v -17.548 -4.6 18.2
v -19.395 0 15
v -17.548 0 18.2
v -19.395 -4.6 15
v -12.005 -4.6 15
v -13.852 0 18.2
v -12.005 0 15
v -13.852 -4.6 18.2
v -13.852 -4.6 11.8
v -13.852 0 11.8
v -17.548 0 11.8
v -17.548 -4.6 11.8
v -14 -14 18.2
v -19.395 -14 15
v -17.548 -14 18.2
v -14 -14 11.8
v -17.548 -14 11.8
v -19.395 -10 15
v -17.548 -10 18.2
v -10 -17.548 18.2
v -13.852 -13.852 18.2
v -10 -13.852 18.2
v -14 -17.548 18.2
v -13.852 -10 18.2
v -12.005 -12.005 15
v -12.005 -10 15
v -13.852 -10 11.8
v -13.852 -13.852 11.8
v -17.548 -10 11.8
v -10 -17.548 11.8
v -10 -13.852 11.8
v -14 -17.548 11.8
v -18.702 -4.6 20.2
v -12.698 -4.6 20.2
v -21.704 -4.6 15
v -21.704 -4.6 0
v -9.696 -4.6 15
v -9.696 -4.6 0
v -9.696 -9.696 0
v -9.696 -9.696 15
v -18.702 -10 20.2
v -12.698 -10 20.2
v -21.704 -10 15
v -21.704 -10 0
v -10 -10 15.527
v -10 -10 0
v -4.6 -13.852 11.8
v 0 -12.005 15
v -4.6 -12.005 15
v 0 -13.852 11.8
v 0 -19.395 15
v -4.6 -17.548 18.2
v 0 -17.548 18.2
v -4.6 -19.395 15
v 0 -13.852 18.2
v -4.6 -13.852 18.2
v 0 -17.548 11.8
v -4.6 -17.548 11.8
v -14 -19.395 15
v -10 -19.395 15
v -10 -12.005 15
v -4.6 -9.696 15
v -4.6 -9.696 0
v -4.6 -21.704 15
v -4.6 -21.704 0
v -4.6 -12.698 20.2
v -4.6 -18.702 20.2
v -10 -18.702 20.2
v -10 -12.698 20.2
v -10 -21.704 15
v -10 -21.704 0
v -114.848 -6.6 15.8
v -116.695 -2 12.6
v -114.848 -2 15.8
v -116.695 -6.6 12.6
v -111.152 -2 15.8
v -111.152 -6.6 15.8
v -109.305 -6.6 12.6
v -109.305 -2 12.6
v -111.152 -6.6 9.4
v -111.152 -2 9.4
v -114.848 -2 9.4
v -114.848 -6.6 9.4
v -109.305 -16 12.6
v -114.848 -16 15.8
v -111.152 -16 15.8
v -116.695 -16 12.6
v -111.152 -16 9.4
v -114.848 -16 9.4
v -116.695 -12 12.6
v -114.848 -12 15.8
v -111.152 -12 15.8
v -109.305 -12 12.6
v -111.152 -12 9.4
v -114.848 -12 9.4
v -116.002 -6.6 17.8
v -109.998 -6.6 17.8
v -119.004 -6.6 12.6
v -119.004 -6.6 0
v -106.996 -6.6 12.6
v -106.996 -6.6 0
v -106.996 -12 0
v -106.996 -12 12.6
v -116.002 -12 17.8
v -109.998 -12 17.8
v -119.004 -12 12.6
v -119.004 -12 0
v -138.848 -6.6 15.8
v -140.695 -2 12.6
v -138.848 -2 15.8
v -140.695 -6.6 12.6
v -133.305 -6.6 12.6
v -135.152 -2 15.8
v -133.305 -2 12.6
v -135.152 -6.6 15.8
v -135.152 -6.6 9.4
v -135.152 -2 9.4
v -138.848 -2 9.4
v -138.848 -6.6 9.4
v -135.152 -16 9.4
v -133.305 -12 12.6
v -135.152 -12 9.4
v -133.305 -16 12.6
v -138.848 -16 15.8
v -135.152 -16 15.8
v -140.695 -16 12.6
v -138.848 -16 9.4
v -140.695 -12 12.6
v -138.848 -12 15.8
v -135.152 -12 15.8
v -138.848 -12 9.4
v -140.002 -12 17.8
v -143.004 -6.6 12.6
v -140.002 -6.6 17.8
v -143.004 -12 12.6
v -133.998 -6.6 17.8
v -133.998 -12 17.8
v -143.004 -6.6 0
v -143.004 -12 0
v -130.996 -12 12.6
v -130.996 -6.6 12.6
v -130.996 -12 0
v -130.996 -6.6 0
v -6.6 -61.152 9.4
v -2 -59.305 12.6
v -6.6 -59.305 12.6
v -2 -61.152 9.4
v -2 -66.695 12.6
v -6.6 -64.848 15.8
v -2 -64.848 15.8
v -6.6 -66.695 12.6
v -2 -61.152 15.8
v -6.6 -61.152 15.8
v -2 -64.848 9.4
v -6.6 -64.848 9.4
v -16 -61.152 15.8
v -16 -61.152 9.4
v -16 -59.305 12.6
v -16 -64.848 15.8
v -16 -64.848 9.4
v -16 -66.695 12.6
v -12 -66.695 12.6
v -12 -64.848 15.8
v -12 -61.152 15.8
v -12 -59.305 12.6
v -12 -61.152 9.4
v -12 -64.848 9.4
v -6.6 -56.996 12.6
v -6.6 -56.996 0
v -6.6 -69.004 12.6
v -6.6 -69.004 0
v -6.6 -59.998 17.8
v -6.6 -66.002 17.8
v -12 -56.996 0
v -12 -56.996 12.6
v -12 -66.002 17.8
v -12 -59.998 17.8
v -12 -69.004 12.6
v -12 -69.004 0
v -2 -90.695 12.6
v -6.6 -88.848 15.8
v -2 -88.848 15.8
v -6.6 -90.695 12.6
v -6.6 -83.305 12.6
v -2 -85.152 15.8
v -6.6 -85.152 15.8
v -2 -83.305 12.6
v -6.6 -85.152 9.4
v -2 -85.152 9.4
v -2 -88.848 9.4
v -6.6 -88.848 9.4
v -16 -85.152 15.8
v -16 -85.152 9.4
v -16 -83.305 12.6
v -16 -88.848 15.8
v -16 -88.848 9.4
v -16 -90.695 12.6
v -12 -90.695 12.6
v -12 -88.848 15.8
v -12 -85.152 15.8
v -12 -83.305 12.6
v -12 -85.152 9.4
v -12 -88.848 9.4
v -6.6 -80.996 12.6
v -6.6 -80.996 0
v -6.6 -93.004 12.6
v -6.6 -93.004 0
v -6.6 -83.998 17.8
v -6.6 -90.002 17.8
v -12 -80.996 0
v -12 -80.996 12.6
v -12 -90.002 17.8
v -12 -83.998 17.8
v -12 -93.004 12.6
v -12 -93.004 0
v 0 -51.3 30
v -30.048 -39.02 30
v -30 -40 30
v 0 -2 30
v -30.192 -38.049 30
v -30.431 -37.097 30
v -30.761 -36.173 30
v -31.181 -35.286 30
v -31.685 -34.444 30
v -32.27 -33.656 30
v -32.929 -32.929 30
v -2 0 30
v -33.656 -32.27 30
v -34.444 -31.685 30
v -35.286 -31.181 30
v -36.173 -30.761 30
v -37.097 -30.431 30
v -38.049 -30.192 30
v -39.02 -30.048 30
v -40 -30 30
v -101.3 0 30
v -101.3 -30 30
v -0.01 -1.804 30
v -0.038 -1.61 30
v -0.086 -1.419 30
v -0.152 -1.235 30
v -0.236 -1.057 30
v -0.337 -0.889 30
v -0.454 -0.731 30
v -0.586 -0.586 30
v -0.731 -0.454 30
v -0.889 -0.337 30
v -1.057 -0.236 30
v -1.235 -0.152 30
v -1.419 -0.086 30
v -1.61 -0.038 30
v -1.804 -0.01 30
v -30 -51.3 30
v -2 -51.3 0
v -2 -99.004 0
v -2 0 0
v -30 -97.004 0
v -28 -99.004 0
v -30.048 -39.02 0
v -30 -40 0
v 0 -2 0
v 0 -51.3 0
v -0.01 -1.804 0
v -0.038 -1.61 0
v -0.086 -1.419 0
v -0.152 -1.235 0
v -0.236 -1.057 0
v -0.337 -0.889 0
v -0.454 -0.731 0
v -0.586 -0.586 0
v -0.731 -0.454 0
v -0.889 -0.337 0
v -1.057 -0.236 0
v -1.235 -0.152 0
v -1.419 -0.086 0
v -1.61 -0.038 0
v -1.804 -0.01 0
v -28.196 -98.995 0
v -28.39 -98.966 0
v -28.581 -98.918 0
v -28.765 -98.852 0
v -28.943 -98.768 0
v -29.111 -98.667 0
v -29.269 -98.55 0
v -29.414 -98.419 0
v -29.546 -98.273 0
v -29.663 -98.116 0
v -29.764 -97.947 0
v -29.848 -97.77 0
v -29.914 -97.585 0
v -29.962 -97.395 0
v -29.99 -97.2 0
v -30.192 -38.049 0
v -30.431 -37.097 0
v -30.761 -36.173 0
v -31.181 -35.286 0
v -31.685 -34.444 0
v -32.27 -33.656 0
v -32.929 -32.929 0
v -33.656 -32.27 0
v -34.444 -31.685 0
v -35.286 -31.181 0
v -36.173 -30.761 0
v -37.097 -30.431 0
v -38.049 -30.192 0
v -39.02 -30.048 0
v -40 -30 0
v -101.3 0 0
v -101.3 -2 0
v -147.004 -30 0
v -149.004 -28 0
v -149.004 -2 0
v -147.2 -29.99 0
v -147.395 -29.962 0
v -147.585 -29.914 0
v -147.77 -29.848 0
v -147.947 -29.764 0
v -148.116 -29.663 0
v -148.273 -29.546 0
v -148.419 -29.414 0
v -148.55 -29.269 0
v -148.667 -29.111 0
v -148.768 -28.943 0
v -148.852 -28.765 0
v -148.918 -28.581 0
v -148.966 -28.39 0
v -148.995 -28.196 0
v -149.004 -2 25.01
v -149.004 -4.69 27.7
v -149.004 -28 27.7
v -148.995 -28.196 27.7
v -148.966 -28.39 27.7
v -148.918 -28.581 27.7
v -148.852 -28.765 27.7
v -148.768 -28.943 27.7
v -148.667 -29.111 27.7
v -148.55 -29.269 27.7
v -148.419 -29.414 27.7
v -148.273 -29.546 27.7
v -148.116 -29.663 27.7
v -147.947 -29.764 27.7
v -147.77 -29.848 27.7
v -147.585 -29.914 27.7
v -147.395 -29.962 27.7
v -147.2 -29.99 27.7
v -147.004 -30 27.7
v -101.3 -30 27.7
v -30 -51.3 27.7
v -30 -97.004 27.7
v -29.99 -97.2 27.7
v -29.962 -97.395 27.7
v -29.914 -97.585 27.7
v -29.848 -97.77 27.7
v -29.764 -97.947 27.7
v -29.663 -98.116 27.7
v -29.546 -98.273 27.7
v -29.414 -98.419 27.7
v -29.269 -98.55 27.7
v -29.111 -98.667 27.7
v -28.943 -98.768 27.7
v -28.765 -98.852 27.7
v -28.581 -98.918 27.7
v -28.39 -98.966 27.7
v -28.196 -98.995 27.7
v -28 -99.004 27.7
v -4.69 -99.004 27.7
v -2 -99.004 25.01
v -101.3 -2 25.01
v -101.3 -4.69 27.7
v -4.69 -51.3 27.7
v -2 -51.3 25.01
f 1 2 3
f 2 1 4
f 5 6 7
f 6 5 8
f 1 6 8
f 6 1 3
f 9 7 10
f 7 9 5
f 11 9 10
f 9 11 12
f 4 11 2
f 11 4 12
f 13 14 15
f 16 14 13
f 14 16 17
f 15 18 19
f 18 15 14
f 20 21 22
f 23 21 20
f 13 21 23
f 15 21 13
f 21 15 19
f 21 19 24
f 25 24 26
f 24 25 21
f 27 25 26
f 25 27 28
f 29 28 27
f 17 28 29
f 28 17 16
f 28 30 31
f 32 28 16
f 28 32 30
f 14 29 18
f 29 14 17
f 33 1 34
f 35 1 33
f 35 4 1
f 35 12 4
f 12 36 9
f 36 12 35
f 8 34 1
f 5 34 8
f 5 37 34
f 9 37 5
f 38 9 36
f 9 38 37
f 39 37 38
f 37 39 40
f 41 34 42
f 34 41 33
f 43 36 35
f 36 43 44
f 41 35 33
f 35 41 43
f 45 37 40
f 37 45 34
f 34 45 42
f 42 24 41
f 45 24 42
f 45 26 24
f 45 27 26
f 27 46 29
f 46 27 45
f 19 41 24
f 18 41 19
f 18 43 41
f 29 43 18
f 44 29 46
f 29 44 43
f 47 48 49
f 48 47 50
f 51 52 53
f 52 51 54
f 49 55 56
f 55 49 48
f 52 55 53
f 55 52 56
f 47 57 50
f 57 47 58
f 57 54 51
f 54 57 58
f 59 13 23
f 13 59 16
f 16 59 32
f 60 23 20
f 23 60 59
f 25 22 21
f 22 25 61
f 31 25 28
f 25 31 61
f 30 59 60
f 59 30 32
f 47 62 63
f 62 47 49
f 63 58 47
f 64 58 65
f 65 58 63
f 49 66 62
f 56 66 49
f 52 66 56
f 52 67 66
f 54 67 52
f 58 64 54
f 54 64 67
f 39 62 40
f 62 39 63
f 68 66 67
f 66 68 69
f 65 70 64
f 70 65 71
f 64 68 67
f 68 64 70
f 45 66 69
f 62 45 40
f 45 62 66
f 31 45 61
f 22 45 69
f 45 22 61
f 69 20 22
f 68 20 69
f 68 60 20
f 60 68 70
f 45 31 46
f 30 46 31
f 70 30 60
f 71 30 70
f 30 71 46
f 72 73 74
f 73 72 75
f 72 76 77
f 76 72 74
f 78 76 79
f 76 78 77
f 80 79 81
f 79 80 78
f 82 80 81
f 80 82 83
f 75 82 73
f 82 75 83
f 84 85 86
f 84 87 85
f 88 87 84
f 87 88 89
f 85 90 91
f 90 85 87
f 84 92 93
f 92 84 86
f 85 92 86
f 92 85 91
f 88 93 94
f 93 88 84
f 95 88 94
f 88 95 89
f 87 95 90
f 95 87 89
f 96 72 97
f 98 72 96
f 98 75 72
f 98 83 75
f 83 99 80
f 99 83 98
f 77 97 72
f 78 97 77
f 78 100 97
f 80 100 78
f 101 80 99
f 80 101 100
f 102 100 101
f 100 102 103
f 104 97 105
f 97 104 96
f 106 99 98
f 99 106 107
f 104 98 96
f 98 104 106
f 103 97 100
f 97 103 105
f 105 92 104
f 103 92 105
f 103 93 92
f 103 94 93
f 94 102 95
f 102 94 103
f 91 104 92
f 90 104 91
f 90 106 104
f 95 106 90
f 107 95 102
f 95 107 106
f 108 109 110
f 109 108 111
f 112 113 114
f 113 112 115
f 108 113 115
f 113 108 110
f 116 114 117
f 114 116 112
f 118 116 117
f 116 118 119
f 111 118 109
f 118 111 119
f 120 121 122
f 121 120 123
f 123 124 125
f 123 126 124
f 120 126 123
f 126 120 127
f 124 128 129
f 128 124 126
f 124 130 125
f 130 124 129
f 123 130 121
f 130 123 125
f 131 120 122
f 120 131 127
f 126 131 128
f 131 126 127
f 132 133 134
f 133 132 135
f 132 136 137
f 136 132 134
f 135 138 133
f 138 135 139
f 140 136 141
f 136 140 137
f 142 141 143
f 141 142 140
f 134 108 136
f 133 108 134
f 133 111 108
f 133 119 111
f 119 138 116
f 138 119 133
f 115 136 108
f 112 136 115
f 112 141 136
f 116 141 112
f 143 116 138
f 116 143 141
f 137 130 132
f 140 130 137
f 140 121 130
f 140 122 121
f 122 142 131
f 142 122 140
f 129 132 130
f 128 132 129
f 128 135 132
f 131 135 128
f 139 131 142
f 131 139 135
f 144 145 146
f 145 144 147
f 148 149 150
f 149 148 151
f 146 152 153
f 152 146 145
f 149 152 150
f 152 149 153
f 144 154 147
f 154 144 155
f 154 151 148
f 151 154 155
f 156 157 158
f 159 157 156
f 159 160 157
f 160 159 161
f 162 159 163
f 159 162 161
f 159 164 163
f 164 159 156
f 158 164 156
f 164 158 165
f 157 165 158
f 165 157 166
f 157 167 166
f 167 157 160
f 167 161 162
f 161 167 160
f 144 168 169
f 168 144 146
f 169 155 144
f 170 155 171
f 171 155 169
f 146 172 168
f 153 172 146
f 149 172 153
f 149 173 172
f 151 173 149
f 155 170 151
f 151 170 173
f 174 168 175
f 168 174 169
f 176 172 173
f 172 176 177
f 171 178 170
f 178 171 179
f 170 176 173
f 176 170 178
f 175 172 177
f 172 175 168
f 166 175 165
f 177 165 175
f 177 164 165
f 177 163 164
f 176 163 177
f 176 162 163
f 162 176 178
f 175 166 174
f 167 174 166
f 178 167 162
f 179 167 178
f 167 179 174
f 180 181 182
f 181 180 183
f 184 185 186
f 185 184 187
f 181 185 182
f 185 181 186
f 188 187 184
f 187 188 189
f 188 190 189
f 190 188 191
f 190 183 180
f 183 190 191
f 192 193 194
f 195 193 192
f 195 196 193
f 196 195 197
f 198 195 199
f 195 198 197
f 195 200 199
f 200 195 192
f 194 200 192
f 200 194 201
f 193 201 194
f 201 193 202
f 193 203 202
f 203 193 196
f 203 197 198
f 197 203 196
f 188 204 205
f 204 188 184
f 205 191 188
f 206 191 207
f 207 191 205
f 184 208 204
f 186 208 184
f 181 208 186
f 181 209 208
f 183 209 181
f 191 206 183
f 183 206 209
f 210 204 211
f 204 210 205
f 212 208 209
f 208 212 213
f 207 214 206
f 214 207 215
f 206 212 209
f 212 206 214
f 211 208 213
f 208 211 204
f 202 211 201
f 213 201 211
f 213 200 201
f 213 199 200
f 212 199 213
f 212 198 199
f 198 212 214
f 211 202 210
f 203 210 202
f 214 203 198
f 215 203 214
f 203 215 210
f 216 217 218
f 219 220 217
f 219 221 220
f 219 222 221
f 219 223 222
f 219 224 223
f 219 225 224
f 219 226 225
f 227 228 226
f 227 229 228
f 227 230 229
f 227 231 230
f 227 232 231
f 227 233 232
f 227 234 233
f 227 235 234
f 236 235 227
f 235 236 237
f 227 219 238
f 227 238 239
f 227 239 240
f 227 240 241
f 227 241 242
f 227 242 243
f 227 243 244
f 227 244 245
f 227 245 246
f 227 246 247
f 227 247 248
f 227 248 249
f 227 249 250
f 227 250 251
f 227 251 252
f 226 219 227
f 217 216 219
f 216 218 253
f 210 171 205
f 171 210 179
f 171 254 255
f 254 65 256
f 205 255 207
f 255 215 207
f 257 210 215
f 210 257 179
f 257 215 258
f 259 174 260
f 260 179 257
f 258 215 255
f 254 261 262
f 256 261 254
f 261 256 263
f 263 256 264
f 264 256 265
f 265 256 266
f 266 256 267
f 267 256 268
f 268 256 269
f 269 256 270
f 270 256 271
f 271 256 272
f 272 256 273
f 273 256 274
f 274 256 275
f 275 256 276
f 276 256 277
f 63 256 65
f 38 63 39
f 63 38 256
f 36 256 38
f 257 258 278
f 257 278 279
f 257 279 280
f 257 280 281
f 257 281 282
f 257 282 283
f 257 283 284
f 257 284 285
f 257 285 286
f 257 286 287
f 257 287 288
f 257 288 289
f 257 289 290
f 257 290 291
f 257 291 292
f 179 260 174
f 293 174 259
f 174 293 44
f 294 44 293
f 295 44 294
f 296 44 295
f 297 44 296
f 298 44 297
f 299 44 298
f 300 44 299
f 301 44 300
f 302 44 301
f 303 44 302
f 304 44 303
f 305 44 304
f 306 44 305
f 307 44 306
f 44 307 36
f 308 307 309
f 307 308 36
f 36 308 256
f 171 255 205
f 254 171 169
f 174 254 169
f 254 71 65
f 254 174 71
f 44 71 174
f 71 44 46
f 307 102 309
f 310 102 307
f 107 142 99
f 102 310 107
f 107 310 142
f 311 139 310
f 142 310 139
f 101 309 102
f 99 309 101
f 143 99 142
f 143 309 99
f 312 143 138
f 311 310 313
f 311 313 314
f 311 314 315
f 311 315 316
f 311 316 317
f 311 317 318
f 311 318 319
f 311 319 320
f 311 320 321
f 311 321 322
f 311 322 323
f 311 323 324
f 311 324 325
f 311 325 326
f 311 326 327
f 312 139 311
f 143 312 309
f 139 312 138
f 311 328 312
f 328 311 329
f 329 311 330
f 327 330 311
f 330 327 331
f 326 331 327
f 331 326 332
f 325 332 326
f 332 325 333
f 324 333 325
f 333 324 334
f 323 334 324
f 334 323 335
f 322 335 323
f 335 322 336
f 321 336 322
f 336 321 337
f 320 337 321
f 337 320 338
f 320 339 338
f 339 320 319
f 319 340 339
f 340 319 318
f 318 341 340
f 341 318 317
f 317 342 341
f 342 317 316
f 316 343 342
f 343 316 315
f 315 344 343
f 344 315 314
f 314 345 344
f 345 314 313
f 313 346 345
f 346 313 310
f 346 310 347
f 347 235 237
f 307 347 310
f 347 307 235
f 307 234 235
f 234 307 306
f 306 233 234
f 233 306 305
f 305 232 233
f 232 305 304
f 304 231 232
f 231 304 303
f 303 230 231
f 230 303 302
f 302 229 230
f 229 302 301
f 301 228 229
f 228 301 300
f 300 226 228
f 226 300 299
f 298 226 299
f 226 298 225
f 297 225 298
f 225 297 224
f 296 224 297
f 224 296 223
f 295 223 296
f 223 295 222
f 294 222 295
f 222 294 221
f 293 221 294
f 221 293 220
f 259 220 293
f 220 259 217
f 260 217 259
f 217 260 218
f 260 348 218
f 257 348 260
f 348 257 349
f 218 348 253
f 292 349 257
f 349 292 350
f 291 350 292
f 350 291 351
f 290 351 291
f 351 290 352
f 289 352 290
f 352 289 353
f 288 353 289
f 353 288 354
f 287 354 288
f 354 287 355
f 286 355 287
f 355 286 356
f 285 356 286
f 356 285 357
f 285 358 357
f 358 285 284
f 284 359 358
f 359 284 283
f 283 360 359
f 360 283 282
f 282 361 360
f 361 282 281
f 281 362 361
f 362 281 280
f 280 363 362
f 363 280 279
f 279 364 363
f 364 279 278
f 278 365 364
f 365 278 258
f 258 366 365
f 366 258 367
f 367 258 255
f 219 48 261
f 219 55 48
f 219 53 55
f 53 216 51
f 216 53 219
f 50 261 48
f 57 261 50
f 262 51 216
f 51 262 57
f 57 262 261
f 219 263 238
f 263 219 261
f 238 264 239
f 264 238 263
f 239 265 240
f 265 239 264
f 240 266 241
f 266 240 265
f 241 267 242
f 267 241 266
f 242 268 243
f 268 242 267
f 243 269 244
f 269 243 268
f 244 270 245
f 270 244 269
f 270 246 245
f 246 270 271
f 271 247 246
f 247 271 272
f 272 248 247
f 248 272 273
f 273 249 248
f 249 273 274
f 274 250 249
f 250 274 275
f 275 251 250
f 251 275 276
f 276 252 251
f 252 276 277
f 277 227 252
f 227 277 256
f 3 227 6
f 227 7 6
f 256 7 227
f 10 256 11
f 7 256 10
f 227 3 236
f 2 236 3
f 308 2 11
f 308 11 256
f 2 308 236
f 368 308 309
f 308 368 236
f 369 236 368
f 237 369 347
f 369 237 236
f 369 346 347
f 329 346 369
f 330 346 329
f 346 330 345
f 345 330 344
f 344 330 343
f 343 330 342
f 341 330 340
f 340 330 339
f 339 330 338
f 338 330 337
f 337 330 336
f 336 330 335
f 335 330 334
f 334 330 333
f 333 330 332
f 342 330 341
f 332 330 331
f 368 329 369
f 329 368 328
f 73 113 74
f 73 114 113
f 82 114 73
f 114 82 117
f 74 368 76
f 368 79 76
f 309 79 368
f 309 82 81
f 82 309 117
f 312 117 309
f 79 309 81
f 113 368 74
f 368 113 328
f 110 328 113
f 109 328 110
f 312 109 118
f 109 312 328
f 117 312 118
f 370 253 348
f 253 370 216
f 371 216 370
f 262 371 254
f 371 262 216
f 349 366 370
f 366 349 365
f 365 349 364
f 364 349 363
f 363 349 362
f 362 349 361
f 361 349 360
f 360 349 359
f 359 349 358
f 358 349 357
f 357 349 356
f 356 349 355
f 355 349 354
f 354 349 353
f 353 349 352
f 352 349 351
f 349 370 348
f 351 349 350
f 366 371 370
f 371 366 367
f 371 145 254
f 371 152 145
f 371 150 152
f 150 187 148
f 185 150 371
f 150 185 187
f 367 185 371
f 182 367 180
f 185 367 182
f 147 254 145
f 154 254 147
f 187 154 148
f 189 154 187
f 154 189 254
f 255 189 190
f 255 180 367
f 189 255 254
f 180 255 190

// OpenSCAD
// file: ../../../modules/steel_rack.scad
use <bolts.scad>;

bolt_edge_offset = 15;
bolt_positions = [
  bolt_edge_offset,
  bolt_edge_offset + 98,
  bolt_edge_offset + 98 + 24,
];

module bolt_and_nut(y, h) {
  nut_thickness = 5;
  translate([0, y, h / 2])
    m6_bolt_hole(h + 1, center = true);
  translate([0, y, h - nut_thickness / 2])
    rotate([0, 0, 90])
    m6_nut_trap(nut_thickness, center = true);
}

module long_bar(w, y, h) {
  difference() {
    translate([w / 2, y / 2, h / 2])
      cube([w, y, h], center = true);

    for (x = bolt_positions) {
      translate([x, 0, 0])
        bolt_and_nut(y / 2, h);
    }
  }
}

module short_bar(w, y, h) {
  difference() {
    translate([w / 2, y / 2, h / 2])
      cube([w, y, h], center = true);

    translate([bolt_positions[0], 0, 0])
      bolt_and_nut(y / 2, h);
  }
}

module fillet_profile(r, h) {
  linear_extrude(height = h, center = true)
    difference() {
      square([r, r]);
      circle(r = r, $fn = 64);
    }
}
// file: ../../../modules/slide_rail_outer_bracket.scad
use <bolts.scad>
use <steel_rack.scad>

// スライドレール外側とL字アングルを接合するL字ブラケット。
// 設計の経緯と確定値は ledger/designs/steel-rack-500x400.md が正本。
//
// 座標系 (部品自身の datum):
//   X = 0 がこの部品側のL字アングル外側面。部品はアングル板厚の内側から始まる
//   Y = 0 がスライドレール外側面。+Y がラック外側
//   Z = 0 が部品底面 (レール下端と一致)
// front は screw_x = [37, 101.5]、rear は [79.5, 176] を自分の datum
// から渡す。 M6 が高さ 22.5±12 の対称配置のため部品は Z 反転対称になり、
// 左右のレールにも上下反転するだけで同じ2部品を使い回せる。

bracket_height = 45;
flange_t = 10; // 短辺 (X方向厚) の厚さ
// 長辺 (Y方向厚) の厚さ。旧断面は flange_t=10 を共用していたが、レール面を
// rail_offset 分外へ出すと M6 ナット挿入口が長辺と重なるため 2mm 削った
// (10→8、user決定)。ナット六角の内縁 (y=8.000) と長辺外面がツライチになる
arm_t = 8;
// レール接触面のラック外側オフセット。組付け実測でレール間隔が 385mm しか
// なくケース 412mm が入らないため、(412 - 385) / 2 + 0.5 = 14mm ずつ
// 各レールを外側へ移す (user指示)。M6 実穴は既に開いており位置を変えられない
rail_offset = 14;
inner_r = 4;
m6_z = [ 10.5, 34.5 ];
// クリアランス基準: 呼び寸法 + 0.4mm (実プリントの嵌合結果から拡大)
m6_pass_flat = 6.4; // M6ボルト通し六角の二面幅 (手前5mm)
m6_nut_flat = 10.4; // M6ナット窪み六角の二面幅 (奥5mm、ナット実測9.8 + 実効0.6)
m6_stage_depth = 5;
screw_z = 22.5;
m4_pass_flat = 4.4; // M4小トラスネジ通し六角の二面幅
m4_nut_flat = 7.4; // M4ナット窪み六角の二面幅 (ナット実測6.8 + 実効0.6)
m4_nut_depth = 2.8; // M4ナット窪みの深さ (user指定)
edge_margin = 8; // 穴の外縁から部品端までの余白 (自由な辺のみ)
angle_t = 2.2; // L字アングルの板厚

// 六角プリズム: 軸X・上下の辺が水平 (flat-up)。
// 天井を短い水平ブリッジにして垂れの改善を狙う
// (point-up だと天井面が水平から30°になり垂れた — 嵌合試験で確認済み)
module
hex_x_flat_up(flat_d, l)
{
    rotate([ 0, 90, 0 ]) rotate([ 0, 0, 90 ]) hex_hole(flat_d = flat_d, h = l);
}

// 六角プリズム: 軸Y・上下の辺が水平 (flat-up)。M6と同じくブリッジ天井
module
hex_y_flat_up(flat_d, l)
{
    rotate([ 90, 0, 0 ]) hex_hole(flat_d = flat_d, h = l);
}

module
slide_rail_outer_bracket(screw_x, name = "bracket")
{
    // flat-up配置では水平方向の穴半径は対角/2 (= 二面幅/(2*cos30))。
    // 8mm余白の契約はこの実半径に対して守る
    m6_nut_diag = m6_nut_flat / cos(30);
    m4_nut_diag = m4_nut_flat / cos(30);
    // M6中心: 実物のアングルには旧断面 (長辺厚10) の導出値
    // (厚10 + 内側R + 余白 + M6六角対角/2 = 28.0044) で既に穴が開いている。
    // 旧導出式から rail_offset を引くことで M6 実穴と部品外端の絶対位置を
    // 保ったまま、レール接触面 (y=0) だけをラック外側へ 14mm 出す
    m6_y = flange_t + inner_r + edge_margin + m6_nut_diag / 2 - rail_offset;
    short_len = m6_y + m6_nut_diag / 2 + edge_margin;
    // 長辺のX終端: 最奥のM4穴の最大断面 (ナット窪みの対角の半分) + 余白
    arm_end = max(screw_x) + m4_nut_diag / 2 + edge_margin;

    echo(str("CONTRACT ", name, ": height = ", bracket_height));
    echo(str("CONTRACT ", name, ": flange_t = ", flange_t));
    echo(str("CONTRACT ", name, ": arm_t = ", arm_t));
    echo(str("CONTRACT ", name, ": rail_offset = ", rail_offset));
    echo(str("CONTRACT ", name, ": inner_r = ", inner_r));
    echo(str("CONTRACT ", name, ": m6_z = ", m6_z));
    echo(str("CONTRACT ", name, ": m6_pass_flat = ", m6_pass_flat));
    echo(str("CONTRACT ", name, ": m6_nut_flat = ", m6_nut_flat));
    echo(str("CONTRACT ", name, ": screw_z = ", screw_z));
    echo(str("CONTRACT ", name, ": m4_pass_flat = ", m4_pass_flat));
    echo(str("CONTRACT ", name, ": m4_nut_flat = ", m4_nut_flat));
    echo(str("CONTRACT ", name, ": m4_nut_depth = ", m4_nut_depth));
    echo(str("CONTRACT ", name, ": edge_margin = ", edge_margin));
    echo(str("CONTRACT ", name, ": angle_t = ", angle_t));
    echo(str("CONTRACT ", name, ": screw_x = ", screw_x));
    echo(str("CONTRACT ",
             name,
             ": m6_y = ",
             m6_y,
             ", short_len = ",
             short_len,
             ", arm_end = ",
             arm_end));

    // 余白の契約 (自由な辺のみ。高さ45とM6のZはuser固定値なので対象外)。
    // M6ナット六角の内縁 (m6_y - 対角/2 = 8.000) は長辺外面 (y = arm_t) と
    // ツライチで、ナット挿入口が長辺に塞がれない (1e-9 は浮動小数の丸め猶予)
    assert(m6_y - m6_nut_diag / 2 >= arm_t - 1e-9,
           "M6 nut slot is blocked by the arm");
    assert(short_len - (m6_y + m6_nut_diag / 2) >= edge_margin,
           "M6 hole too close to the short-flange edge");
    assert(arm_end - (max(screw_x) + m4_nut_diag / 2) >= edge_margin,
           "M4 hole too close to the arm end");
    assert(min(screw_x) - m4_nut_diag / 2 >= angle_t + flange_t,
           "M4 hole overlaps the short flange");

    difference()
    {
        union()
        {
            // 短辺: アングル内側に当たる縦板 (M6で締結)
            translate([ angle_t, 0, 0 ])
                cube([ flange_t, short_len, bracket_height ]);

            // 長辺: レール外側面に当たる横板 (M4小トラスネジ+ナットで締結)
            translate([ angle_t, 0, 0 ])
                cube([ arm_end - angle_t, arm_t, bracket_height ]);

            // 内側コーナーのR4フィレット (応力集中の回避)
            translate([
                angle_t + flange_t + inner_r,
                arm_t + inner_r,
                bracket_height / 2
            ]) rotate([ 0, 0, 180 ]) fillet_profile(inner_r, bracket_height);
        }

        // M6の2段六角穴 (軸X・flat-up): 手前5mmが通し、奥5mmがナット窪み。
        // ナット窪みは +X へ延長した挿入回廊 (x=7.2..17): 短辺の背面から
        // fillet の掛かる区間を局所カットし、fillet 外端 (x=16.2) を 0.8mm
        // 超えて開放することで M6 ナットを +X 側から真っ直ぐ挿入できる
        // (fillet と挿入経路の干渉分を削るのは user 許容)。
        // 六角の下頂点 (y=8.000) は長辺外面とツライチで、正確な接触は
        // 退化した稜 (非多様体STL) を作るため、hull で 0.2mm 下へ掃引して
        // 長辺外面に浅い逃げ溝を彫る (ナットの嵌合には影響しない)
        slot_start = angle_t + flange_t - m6_stage_depth;
        slot_end = angle_t + flange_t + inner_r + 0.8;
        slot_relief = 0.2;
        for (z = m6_z) {
            translate([ angle_t + m6_stage_depth / 2 - 0.05, m6_y, z ])
                hex_x_flat_up(m6_pass_flat, m6_stage_depth + 0.1);
            translate([ (slot_start + slot_end) / 2, m6_y, z ]) hull()
            {
                hex_x_flat_up(m6_nut_flat, slot_end - slot_start);
                translate([ 0, -slot_relief, 0 ])
                    hex_x_flat_up(m6_nut_flat, slot_end - slot_start);
            }
        }

        // M4小トラスネジの穴 (軸Y・flat-up):
        // 通しは全厚を貫通し、L字の内側面 (y=8) から深さ2.8mmのナット窪み。
        // ネジはレール内側から刺さり
        // (トラス頭はスライダーと干渉しない実測済み)、
        // ナットが窪みの底で受けてレール板とブラケットを共締めする
        for (x = screw_x) {
            translate([ x, arm_t / 2, screw_z ])
                hex_y_flat_up(m4_pass_flat, arm_t + 0.2);
            translate([ x, arm_t - m4_nut_depth / 2 + 0.05, screw_z ])
                hex_y_flat_up(m4_nut_flat, m4_nut_depth + 0.1);
        }
    }
}
// file: ../../../modules/bolts.scad
module nut_trap(d, h, center = true) {
  linear_extrude(height = h, center = center)
  circle(d = d / cos(30), $fn = 6);
}

module bolt_hole(d, h, center = true) {
  linear_extrude(height = h, center = center)
  circle(d = d, $fn = 64);
}

// Hex holes for self-tapping (nominal - 0.2mm)
module hex_hole(flat_d, h) {
  linear_extrude(height = h, center = true)
  circle(d = flat_d / cos(30), $fn = 6);
}

module m3_bolt_hexhole(h) {
  rotate([0, 0, 90]) hex_hole(flat_d = 2.8, h = h);
}

module m4_bolt_hexhole(h) {
  rotate([0, 0, 90]) hex_hole(flat_d = 3.8, h = h);
}

module m6_bolt_hexhole(h) {
  rotate([0, 0, 90]) hex_hole(flat_d = 5.8, h = h);
}

module m8_bolt_hexhole(h) {
  rotate([0, 0, 90]) hex_hole(flat_d = 7.8, h = h);
}

// M3
module m3_bolt_hole(h, center = false) { bolt_hole(d = 3.4, h = h, center = center); }
module m3_nut_trap(h, center = false) { nut_trap(d = 5.7, h = h, center = center); }

// M4
module m4_bolt_hole(h, center = false) { bolt_hole(d = 4.4, h = h, center = center); }
module m4_nut_trap(h, center = false) { nut_trap(d = 7.5, h = h, center = center); }

// M6
module m6_bolt_hole(h, center = false) { bolt_hole(d = 6.2, h = h, center = center); }
module m6_nut_trap(h, center = false) { nut_trap(d = 10.2, h = h, center = center); }

// M8
module m8_bolt_hole(h, center = false) { bolt_hole(d = 8.4, h = h, center = center); }
module m8_nut_trap(h, center = false) { nut_trap(d = 13.3, h = h, center = center); }
// main file
use <../../../modules/shelf_frame.scad>

// ケース棚の枠の角。手前右・奥左用（左用の鏡像）。
shelf_frame_corner_print(mirrored = true);
